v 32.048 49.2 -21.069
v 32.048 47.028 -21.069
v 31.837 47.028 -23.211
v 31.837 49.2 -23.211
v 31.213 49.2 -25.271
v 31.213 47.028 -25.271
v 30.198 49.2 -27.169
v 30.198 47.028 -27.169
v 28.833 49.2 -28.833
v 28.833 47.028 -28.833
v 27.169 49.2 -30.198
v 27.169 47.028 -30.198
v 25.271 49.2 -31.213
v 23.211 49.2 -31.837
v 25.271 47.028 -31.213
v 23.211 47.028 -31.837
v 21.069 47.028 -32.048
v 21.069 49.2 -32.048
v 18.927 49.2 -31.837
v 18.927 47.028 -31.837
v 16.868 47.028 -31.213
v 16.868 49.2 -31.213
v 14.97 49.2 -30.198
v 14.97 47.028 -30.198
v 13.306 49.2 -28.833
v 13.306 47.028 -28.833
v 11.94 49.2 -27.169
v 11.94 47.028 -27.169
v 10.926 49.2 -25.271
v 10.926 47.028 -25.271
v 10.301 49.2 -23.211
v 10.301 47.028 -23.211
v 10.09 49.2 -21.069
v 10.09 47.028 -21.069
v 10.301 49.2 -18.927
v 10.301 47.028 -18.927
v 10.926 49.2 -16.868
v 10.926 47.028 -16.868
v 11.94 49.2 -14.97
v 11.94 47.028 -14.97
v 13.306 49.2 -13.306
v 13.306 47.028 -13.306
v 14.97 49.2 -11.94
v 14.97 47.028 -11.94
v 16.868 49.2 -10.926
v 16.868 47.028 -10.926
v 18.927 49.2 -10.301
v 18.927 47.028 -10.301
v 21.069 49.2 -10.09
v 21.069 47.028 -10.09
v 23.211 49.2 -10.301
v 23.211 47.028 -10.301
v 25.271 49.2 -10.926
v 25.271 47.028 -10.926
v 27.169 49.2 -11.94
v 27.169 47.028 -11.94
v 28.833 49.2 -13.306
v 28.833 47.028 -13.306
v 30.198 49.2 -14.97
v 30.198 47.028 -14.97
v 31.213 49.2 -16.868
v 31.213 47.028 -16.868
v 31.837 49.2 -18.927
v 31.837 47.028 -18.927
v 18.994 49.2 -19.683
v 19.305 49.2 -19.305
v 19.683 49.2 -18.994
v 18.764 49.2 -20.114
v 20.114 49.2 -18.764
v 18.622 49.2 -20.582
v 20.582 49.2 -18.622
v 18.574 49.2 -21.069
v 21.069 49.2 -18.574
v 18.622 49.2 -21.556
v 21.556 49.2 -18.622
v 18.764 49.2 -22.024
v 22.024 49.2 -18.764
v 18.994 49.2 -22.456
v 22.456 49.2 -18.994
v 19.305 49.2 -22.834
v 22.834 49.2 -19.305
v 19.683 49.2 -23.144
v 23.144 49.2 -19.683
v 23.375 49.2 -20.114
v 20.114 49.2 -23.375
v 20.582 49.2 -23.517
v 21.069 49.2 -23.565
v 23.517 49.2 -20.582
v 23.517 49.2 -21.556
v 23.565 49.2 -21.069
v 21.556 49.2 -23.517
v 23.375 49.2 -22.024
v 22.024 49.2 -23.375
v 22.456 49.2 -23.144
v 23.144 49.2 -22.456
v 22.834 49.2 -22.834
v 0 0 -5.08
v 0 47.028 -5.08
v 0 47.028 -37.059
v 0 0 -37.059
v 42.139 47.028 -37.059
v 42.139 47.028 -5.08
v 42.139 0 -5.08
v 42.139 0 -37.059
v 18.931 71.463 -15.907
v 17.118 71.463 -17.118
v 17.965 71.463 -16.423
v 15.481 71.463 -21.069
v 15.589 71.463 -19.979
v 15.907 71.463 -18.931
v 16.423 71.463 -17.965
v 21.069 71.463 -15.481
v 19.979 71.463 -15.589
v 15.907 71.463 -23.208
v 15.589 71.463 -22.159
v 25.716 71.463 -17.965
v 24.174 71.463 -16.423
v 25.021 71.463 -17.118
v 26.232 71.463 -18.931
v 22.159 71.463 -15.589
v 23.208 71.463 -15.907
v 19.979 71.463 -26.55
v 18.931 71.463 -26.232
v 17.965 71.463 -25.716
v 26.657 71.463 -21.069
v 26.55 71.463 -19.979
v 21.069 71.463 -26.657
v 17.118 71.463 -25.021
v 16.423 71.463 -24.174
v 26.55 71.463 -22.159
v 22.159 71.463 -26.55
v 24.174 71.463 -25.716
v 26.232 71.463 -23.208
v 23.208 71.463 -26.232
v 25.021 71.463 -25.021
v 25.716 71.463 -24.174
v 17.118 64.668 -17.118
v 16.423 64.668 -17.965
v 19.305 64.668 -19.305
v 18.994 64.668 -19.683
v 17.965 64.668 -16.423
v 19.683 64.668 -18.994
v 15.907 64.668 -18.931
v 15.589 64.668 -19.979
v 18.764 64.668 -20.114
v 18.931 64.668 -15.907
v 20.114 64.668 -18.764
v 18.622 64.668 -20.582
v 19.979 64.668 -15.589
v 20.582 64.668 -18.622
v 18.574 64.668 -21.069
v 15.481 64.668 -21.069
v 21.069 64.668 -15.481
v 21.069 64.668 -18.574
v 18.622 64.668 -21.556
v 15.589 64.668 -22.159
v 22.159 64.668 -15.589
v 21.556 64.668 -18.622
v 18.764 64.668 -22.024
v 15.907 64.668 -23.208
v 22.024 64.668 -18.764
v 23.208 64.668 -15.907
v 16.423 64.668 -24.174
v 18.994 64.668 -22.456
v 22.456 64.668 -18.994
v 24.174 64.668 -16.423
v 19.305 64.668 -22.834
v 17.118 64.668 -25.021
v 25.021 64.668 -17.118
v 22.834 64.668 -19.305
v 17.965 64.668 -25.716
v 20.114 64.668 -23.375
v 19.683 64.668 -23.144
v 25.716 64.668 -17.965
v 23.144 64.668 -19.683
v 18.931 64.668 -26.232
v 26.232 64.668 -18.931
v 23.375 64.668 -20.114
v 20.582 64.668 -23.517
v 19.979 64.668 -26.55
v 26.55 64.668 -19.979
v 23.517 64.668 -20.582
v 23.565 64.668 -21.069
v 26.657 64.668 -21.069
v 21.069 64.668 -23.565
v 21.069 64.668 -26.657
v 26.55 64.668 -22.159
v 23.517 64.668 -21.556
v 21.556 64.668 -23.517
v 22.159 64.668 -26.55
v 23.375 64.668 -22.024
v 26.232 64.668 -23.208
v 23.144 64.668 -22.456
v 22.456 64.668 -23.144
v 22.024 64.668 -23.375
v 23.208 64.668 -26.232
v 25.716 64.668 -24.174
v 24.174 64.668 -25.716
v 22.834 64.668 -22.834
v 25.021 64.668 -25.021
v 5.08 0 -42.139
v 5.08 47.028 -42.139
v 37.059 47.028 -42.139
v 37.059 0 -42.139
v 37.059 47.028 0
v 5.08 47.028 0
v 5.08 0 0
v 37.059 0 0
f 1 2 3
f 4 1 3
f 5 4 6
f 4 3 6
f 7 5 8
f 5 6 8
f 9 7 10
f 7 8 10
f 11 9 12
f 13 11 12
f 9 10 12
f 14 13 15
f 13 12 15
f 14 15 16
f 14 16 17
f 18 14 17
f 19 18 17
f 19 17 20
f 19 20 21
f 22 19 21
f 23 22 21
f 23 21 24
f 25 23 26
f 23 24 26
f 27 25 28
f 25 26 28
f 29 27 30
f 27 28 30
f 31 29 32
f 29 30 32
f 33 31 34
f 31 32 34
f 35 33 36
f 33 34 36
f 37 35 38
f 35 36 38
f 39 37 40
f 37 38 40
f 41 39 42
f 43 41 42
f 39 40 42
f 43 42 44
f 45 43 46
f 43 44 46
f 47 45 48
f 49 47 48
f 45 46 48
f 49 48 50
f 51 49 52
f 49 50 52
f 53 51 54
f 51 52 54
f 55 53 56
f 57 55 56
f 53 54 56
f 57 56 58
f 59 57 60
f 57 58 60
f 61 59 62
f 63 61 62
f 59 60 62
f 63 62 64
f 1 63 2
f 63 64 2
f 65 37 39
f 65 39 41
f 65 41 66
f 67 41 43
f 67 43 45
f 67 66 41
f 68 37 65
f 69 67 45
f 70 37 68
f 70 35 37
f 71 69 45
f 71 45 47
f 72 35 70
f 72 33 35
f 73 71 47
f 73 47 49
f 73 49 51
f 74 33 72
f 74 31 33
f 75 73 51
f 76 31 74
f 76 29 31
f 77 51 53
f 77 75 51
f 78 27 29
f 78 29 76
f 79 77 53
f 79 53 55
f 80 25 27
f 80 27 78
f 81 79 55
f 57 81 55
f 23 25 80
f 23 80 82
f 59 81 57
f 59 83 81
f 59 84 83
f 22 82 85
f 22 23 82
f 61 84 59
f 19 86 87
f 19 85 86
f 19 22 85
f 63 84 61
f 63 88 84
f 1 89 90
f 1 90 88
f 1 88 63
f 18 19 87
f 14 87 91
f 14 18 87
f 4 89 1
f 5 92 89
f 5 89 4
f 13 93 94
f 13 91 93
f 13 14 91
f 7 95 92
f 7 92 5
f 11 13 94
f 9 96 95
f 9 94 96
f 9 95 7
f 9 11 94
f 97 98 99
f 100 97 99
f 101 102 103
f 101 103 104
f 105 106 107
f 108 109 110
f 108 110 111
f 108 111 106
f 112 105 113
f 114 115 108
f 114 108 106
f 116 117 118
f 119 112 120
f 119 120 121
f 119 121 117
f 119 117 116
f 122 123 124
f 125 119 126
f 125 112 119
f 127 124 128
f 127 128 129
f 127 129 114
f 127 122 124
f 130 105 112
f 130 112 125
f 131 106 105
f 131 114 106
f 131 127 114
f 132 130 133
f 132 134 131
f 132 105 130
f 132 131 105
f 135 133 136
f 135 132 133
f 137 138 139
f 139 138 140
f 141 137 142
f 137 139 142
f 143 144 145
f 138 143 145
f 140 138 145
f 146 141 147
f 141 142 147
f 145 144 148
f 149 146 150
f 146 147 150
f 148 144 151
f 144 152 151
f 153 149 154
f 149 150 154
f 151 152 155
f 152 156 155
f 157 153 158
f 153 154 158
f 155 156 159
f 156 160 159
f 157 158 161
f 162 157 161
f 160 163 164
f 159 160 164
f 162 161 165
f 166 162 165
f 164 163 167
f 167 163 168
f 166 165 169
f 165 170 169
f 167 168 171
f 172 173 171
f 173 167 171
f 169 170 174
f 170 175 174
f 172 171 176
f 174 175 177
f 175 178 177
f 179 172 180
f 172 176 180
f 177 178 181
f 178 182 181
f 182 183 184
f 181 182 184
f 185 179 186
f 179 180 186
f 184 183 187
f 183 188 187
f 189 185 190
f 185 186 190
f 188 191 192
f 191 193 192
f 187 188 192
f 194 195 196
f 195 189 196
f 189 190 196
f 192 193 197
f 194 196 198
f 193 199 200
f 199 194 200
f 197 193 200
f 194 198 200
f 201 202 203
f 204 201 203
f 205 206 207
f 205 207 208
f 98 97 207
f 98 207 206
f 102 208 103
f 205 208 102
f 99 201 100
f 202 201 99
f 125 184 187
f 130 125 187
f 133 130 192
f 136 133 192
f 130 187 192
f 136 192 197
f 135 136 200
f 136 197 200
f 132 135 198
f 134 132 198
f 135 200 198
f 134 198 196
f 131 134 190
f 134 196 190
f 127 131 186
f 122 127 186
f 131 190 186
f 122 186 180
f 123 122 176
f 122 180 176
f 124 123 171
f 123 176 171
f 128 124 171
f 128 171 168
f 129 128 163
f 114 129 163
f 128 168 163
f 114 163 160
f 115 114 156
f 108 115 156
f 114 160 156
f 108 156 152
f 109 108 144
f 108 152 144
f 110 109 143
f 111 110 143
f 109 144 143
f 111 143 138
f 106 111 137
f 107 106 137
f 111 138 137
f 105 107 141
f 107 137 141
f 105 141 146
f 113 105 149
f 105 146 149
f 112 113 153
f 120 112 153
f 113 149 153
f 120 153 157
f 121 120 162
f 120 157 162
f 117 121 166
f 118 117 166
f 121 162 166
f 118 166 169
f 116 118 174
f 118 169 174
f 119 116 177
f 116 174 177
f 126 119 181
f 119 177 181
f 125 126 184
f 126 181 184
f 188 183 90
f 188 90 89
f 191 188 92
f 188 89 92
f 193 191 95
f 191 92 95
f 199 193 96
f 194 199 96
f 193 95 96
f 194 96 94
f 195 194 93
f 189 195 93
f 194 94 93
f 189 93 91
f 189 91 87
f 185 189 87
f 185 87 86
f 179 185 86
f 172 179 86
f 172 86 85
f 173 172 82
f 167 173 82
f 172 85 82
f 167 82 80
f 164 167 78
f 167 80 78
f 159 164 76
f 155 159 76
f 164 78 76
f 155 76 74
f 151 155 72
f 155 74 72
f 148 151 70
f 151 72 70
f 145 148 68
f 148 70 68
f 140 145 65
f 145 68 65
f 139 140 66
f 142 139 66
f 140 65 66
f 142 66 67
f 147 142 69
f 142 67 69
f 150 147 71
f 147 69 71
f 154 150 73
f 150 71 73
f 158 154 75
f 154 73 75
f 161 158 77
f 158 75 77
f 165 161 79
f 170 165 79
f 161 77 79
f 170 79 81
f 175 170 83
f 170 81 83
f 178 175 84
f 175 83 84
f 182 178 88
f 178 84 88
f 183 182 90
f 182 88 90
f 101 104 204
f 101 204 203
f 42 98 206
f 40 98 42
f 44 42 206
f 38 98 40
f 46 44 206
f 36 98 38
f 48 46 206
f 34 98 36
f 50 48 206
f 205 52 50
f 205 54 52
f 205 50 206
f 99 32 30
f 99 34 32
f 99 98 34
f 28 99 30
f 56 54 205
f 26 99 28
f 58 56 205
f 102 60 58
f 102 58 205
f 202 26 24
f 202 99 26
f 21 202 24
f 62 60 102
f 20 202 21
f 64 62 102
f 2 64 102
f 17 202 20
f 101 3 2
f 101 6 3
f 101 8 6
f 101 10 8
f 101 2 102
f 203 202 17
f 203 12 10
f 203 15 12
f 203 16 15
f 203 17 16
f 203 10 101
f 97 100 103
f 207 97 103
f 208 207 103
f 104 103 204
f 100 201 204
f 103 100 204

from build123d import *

# Parameters (mm, degrees)
SKETCH1_W           = 42.1386
SKETCH1_H           = 42.1386
BOSS_EXTRUDE1_DEPTH = 47.0281
SKETCH2_R           = 10.97915
BOSS_EXTRUDE2_DEPTH = 2.1717
SKETCH3_R           = 2.49555
BOSS_EXTRUDE3_DEPTH = 15.4686
CHAMFER1_SIZE       = 5.08
CHAMFER2_SIZE       = 5.08
CHAMFER3_SIZE       = 5.08
CHAMFER4_SIZE       = 5.08
SKETCH5_R           = 5.588
BOSS_EXTRUDE4_DEPTH = 6.7945


with BuildPart() as part:
    # Sketch1 → Boss-Extrude1 (new body)
    with BuildSketch(Plane(origin=(0, 0, 0), x_dir=(1, 0, 0), z_dir=(0, 1, 0))):
        with Locations((21.0693, 21.0693)):
            Rectangle(SKETCH1_W, SKETCH1_H)
    extrude(amount=BOSS_EXTRUDE1_DEPTH)

    # Sketch2 → Boss-Extrude2 (add)
    with BuildSketch(Plane(origin=(0, 47.0281, 0), x_dir=(1, 0, 0), z_dir=(0, 1, 0))):
        with Locations((21.0693, 21.0693)):
            Circle(SKETCH2_R)
    extrude(amount=BOSS_EXTRUDE2_DEPTH)

    # Sketch3 → Boss-Extrude3 (add)
    with BuildSketch(Plane(origin=(0, 49.1998, 0), x_dir=(1, 0, 0), z_dir=(0, 1, 0))):
        with Locations((21.0693, 21.0693)):
            Circle(SKETCH3_R)
    extrude(amount=BOSS_EXTRUDE3_DEPTH)

    # Chamfer1
    chamfer1_edges = [part.edges().sort_by_distance(p)[0] for p in [
        (42.1386, 23.51405, -42.1386),
    ]]
    chamfer(chamfer1_edges, length=CHAMFER1_SIZE)

    # Chamfer2
    chamfer2_edges = [part.edges().sort_by_distance(p)[0] for p in [
        (42.1386, 23.51405, 0),
    ]]
    chamfer(chamfer2_edges, length=CHAMFER2_SIZE)

    # Chamfer3
    chamfer3_edges = [part.edges().sort_by_distance(p)[0] for p in [
        (0, 23.51405, 0),
    ]]
    chamfer(chamfer3_edges, length=CHAMFER3_SIZE)

    # Chamfer4
    chamfer4_edges = [part.edges().sort_by_distance(p)[0] for p in [
        (0, 23.51405, -42.1386),
    ]]
    chamfer(chamfer4_edges, length=CHAMFER4_SIZE)

    # Sketch5 → Boss-Extrude4 (add)
    with BuildSketch(Plane(origin=(0, 64.6684, 0), x_dir=(1, 0, 0), z_dir=(0, 1, 0))):
        with Locations((21.0693, 21.0693)):
            Circle(SKETCH5_R)
    extrude(amount=BOSS_EXTRUDE4_DEPTH)


solid = part.part
